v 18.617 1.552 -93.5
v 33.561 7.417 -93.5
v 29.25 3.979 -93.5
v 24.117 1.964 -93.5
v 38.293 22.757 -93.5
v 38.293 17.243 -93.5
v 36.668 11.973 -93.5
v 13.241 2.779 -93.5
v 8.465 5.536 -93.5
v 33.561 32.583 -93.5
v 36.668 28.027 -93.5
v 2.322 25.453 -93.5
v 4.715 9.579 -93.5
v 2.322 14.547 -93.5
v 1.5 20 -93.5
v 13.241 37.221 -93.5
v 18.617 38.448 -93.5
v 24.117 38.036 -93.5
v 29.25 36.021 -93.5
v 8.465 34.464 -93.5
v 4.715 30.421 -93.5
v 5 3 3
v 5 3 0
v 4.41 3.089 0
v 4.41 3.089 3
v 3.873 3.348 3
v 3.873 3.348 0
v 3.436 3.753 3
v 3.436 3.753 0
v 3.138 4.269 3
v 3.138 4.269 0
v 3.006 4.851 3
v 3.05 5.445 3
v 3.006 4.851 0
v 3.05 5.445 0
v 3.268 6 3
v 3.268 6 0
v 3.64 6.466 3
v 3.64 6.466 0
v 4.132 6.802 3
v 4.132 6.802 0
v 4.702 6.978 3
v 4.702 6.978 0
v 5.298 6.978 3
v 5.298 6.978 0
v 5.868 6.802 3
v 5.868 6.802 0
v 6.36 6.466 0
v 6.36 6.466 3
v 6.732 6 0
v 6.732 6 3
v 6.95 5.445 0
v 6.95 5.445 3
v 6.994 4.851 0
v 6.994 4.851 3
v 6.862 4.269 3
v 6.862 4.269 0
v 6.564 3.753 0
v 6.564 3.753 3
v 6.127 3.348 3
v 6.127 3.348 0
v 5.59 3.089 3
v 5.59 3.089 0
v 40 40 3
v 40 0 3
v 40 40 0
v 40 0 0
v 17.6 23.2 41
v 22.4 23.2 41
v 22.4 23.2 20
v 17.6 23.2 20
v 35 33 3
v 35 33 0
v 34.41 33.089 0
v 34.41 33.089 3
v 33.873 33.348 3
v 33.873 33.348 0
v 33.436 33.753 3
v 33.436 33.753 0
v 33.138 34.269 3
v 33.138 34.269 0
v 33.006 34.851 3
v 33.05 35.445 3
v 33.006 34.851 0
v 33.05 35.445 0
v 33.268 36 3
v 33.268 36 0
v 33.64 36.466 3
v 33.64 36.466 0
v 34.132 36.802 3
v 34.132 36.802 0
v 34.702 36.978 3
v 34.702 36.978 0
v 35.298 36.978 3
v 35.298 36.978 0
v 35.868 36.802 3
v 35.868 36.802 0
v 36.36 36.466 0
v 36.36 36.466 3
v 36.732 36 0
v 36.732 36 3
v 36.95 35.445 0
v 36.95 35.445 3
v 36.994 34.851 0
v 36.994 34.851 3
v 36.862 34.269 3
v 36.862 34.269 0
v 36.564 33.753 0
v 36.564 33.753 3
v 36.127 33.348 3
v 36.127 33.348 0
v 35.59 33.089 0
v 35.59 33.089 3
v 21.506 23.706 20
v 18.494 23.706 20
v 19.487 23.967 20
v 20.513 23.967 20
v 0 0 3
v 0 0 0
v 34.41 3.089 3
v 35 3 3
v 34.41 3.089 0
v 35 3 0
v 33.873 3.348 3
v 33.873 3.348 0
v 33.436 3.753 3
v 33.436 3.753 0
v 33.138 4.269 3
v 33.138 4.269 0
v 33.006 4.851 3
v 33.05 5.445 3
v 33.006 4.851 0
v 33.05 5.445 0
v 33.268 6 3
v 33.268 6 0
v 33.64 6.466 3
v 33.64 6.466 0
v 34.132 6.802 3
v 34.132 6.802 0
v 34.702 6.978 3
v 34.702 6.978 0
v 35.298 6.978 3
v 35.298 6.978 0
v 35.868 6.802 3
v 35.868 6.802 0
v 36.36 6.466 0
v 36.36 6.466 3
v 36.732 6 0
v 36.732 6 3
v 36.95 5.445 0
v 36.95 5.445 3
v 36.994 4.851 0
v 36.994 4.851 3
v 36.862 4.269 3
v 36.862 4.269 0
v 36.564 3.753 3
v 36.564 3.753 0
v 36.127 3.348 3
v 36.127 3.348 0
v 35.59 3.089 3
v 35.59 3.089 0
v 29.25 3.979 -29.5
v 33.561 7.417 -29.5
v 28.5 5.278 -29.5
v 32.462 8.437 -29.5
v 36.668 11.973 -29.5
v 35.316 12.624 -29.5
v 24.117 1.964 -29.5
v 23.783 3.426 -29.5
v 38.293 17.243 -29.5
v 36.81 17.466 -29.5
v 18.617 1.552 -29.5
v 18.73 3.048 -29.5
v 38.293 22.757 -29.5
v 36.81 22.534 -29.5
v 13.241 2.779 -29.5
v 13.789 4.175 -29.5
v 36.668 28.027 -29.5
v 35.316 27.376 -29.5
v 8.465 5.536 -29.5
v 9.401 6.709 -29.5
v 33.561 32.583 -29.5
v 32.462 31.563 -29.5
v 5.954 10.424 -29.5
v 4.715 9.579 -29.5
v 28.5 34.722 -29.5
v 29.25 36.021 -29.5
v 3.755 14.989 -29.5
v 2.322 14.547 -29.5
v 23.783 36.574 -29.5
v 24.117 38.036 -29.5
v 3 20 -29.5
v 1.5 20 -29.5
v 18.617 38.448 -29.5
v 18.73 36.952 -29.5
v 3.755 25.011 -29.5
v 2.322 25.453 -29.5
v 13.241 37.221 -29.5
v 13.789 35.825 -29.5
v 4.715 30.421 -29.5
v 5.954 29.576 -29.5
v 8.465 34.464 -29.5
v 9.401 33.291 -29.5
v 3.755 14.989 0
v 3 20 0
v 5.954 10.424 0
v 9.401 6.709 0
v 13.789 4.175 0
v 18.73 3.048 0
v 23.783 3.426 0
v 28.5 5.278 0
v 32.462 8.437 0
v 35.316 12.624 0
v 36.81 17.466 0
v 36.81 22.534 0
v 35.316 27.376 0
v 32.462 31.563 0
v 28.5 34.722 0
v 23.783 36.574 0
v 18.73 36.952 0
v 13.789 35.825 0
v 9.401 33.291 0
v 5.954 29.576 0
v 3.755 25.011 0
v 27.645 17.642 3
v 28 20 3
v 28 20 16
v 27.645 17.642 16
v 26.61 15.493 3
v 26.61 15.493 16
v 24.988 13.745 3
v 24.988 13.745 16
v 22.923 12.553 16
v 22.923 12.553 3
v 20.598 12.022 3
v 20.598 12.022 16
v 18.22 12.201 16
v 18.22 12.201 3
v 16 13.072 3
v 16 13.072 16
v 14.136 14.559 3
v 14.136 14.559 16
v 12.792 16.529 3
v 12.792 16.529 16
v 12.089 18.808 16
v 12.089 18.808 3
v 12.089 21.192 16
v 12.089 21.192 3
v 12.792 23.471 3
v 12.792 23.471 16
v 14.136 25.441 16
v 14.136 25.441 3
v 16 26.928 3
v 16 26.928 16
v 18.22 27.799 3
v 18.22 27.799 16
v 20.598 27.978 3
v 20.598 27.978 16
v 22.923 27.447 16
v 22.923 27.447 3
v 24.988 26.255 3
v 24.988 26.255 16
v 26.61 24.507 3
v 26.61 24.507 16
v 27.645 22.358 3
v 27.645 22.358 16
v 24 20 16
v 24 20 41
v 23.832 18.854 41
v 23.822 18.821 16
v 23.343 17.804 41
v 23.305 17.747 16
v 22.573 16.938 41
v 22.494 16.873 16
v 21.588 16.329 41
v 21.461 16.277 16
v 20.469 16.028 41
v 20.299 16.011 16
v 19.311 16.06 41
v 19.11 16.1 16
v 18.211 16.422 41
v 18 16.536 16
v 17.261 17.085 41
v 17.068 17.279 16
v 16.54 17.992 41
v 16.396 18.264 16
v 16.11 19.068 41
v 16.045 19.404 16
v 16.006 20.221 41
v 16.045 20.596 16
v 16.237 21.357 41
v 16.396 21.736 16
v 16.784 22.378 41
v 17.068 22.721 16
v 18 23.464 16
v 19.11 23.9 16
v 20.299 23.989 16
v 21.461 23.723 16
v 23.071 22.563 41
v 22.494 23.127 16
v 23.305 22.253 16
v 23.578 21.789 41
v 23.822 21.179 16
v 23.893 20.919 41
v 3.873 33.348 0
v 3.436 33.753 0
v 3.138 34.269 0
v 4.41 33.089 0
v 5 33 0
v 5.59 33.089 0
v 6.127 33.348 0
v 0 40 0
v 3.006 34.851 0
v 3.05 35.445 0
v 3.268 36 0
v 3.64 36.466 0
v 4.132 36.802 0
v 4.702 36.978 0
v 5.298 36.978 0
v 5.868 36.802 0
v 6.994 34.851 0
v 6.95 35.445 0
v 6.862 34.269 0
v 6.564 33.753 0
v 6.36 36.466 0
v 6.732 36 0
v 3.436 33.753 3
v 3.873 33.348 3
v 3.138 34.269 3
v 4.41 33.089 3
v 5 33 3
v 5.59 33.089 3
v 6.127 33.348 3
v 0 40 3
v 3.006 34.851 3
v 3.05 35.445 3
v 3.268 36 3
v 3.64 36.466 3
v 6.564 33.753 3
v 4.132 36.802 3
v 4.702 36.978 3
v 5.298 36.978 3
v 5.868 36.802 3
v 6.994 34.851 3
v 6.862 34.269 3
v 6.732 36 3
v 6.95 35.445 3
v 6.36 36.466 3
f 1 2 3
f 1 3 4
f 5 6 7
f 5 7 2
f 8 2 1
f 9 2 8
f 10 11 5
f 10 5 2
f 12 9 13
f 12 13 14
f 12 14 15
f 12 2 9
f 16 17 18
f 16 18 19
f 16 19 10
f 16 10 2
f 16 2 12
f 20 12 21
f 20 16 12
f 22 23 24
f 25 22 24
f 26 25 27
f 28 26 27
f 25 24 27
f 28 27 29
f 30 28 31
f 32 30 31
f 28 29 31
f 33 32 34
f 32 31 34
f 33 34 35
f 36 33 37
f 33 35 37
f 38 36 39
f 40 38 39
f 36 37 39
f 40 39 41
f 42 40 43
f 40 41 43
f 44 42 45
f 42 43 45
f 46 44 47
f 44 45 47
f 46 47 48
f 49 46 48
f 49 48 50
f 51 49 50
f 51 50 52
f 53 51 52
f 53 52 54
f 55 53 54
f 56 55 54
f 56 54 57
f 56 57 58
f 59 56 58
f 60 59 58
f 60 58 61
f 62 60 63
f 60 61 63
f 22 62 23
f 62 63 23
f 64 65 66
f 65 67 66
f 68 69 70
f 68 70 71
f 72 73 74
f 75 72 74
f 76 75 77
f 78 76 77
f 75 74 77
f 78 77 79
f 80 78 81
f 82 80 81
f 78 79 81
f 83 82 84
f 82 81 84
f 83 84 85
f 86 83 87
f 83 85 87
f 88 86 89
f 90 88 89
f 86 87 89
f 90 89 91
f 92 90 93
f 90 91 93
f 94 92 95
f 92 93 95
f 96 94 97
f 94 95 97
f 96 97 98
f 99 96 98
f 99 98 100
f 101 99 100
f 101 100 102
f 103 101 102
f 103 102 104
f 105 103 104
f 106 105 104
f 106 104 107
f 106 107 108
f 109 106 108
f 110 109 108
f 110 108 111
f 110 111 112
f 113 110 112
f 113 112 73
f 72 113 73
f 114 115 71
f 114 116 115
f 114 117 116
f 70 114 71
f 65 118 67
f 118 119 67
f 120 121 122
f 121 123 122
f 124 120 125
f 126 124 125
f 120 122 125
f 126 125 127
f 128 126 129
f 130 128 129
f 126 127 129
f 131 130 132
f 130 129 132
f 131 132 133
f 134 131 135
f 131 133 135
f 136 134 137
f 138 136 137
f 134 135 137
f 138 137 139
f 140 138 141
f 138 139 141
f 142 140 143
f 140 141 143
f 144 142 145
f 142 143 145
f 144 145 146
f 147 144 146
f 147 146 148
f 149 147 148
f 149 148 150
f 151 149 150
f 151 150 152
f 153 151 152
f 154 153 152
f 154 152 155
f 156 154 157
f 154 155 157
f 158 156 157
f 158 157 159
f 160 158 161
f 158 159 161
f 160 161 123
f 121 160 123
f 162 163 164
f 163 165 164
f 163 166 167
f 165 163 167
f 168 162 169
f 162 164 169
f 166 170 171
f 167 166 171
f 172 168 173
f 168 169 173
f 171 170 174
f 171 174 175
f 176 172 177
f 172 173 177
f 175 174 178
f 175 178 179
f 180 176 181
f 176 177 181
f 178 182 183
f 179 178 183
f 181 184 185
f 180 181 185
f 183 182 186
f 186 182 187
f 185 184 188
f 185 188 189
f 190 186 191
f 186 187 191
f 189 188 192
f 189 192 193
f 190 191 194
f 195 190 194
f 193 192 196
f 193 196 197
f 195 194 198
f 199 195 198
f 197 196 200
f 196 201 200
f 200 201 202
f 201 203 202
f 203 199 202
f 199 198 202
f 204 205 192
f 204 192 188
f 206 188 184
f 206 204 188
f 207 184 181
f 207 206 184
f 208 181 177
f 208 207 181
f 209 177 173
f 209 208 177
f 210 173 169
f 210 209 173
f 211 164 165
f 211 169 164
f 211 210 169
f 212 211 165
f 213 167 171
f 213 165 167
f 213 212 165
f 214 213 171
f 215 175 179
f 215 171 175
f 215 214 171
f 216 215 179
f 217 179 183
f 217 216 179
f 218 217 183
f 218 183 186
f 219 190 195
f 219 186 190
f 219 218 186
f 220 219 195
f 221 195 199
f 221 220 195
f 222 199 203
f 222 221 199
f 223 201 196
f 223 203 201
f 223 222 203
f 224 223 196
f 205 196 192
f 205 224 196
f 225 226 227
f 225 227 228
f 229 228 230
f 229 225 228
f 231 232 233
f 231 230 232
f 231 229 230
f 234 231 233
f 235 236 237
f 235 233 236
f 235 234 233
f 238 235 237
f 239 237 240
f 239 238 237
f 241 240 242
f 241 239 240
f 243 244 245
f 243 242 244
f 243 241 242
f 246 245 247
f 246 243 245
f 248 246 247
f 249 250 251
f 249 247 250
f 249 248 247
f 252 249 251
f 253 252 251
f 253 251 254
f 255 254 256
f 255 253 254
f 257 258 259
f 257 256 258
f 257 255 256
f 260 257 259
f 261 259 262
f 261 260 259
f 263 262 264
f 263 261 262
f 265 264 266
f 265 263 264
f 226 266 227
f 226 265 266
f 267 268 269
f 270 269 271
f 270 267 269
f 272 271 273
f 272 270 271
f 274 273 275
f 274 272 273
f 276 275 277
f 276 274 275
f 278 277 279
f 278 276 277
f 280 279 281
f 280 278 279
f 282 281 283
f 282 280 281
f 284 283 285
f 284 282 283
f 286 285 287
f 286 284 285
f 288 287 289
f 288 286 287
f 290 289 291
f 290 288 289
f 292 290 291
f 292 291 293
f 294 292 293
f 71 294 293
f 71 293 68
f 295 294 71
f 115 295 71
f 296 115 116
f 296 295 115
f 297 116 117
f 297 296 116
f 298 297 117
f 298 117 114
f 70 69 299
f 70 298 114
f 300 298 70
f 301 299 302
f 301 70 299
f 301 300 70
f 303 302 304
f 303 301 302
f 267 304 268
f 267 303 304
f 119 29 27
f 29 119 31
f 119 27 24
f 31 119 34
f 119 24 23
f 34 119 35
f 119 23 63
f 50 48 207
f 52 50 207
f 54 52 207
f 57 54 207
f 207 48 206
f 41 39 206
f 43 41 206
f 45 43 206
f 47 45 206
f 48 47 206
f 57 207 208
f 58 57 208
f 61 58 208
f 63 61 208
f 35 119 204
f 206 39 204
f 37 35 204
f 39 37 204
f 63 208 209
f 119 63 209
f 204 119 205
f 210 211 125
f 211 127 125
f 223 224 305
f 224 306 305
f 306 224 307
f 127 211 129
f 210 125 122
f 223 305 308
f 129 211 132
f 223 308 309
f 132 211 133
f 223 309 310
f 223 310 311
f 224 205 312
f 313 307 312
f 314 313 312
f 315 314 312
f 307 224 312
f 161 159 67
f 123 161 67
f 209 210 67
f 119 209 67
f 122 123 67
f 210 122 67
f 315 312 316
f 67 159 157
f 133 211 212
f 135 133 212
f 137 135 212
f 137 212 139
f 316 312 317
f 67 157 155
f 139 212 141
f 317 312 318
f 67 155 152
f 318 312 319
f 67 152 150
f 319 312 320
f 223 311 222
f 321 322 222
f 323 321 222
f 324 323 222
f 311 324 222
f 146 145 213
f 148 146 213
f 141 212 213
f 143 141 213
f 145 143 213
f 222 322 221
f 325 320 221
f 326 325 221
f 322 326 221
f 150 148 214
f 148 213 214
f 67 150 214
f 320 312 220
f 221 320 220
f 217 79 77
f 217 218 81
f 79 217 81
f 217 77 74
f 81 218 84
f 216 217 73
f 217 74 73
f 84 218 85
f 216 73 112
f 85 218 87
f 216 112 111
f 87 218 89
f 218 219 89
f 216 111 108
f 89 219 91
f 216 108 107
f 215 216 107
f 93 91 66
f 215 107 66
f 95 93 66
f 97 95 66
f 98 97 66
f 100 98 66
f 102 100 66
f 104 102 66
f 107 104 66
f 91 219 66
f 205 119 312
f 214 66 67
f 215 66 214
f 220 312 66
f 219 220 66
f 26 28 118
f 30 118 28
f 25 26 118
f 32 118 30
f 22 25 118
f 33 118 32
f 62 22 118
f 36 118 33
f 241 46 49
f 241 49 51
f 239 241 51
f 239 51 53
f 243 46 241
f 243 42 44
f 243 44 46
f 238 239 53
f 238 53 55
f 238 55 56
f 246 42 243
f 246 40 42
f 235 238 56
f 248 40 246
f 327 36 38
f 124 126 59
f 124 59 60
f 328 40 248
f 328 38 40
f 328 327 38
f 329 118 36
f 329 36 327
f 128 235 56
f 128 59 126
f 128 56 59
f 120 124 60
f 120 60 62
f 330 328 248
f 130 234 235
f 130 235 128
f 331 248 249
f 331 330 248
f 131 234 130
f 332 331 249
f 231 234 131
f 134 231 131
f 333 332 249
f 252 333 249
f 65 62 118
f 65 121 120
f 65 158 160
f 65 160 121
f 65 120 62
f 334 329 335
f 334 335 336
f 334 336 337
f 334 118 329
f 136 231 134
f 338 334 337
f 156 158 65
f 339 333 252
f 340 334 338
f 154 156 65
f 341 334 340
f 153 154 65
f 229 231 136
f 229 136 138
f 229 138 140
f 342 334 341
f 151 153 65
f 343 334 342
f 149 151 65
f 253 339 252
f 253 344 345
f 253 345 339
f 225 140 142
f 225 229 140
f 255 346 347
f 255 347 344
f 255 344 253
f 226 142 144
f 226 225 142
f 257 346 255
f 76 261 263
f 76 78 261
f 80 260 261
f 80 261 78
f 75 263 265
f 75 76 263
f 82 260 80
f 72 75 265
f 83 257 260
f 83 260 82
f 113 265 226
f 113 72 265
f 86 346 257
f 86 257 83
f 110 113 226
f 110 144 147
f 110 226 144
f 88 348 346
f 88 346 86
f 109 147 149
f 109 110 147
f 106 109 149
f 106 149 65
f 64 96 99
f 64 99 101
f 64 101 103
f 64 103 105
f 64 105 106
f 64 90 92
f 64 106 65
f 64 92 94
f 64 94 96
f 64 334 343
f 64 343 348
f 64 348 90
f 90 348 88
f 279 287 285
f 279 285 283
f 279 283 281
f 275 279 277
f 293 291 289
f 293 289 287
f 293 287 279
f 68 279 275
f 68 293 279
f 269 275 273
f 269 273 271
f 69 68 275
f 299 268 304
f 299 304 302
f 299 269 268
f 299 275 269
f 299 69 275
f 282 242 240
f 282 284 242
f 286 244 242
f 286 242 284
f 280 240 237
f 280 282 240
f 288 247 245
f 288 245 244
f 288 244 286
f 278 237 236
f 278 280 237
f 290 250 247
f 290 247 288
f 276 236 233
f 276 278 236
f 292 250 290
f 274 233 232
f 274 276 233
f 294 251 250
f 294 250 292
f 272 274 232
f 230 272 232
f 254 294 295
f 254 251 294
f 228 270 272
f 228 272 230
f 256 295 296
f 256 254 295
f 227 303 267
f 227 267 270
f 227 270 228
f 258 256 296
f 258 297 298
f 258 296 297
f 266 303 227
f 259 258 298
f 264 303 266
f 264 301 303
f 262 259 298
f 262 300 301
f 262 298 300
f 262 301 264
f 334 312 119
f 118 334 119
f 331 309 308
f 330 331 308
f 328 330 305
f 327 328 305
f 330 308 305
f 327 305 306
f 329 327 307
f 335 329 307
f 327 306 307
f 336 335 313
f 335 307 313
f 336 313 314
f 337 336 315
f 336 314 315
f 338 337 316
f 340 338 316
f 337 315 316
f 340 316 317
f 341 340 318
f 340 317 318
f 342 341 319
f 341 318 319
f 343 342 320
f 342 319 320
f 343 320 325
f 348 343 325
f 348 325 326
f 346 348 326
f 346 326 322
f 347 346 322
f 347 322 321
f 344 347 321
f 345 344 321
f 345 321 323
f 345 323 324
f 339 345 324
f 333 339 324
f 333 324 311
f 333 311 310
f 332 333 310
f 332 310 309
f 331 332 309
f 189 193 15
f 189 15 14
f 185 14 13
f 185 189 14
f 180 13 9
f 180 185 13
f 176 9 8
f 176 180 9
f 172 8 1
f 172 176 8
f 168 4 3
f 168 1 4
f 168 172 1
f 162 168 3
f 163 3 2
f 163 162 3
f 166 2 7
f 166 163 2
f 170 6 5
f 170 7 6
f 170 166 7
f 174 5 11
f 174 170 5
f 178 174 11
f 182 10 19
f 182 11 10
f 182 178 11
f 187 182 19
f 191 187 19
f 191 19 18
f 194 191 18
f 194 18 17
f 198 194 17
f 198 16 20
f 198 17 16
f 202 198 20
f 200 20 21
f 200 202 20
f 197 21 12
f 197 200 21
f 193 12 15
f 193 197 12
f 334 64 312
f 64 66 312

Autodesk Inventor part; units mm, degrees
ref_plane "YZ Plane" through (0, 0, 0) normal (1, 0, 0) x (0, 1, 0)
ref_plane "XZ Plane" through (0, 0, 0) normal (0, 1, 0) x (-1, 0, 0)
ref_plane "XY Plane" through (0, 0, 0) normal (0, 0, 1) x (1, 0, 0)
sketch "Sketch1" plane through (0, 0, 0) normal (0, 0, 1) x (1, 0, 0)
  line L0 (0, 0) -> (40, 0)
  line L1 (40, 0) -> (40, 40)
  line L2 (40, 40) -> (0, 40)
  line L3 (0, 40) -> (0, 0)
  dimension "d0" = 40
  dimension "d1" = 40
extrude "Extrusion1" add sketch "Sketch1" along normal blind 3
sketch "Sketch2" plane through (0, 0, 3) normal (0, 0, 1) x (1, 0, 0)
  line L0 (40, 0) -> (0, 0) projected
  line L1 (40, 40) -> (40, 0) projected
  line L2 (35, 5) -> (5, 5)
  line L3 (5, 5) -> (5, 35)
  line L4 (5, 35) -> (35, 35)
  line L5 (35, 35) -> (35, 5)
  circle A0 centre (20, 20) radius 8
  dimension "d4" = 30
  dimension "d5" = 30
  dimension "d6" = 5
  dimension "d7" = 5
  dimension "d8" = 16
extrude "Extrusion2" add sketch "Sketch2" along normal blind 13 contours A0
sketch "Sketch3" plane through (0, 0, 3) normal (0, 0, 1) x (1, 0, 0)
  line L0 (40, 0) -> (0, 0) projected
  line L1 (40, 40) -> (40, 0) projected
  line L2 (5, 5) -> (35, 5)
  line L3 (35, 5) -> (35, 35)
  line L4 (35, 35) -> (5, 35)
  line L5 (5, 35) -> (5, 5)
  dimension "d11" = 30
  dimension "d12" = 30
  dimension "d13" = 5
  dimension "d14" = 5
hole "Hole1" at (5, 5, 3) at (35, 5, 3) at (35, 35, 3) at (5, 35, 3) direction (0, 0, -1) diameter 4 end through all
sketch "Sketch4" plane through (20, 20, 16) normal (0, 0, 1) x (1, 0, 0)
  circle A0 centre (0, 0) radius 8 projected
  circle A1 centre (0, 0) radius 4
  point P0 (-20, -20)
  dimension "d22" = 8
extrude "Extrusion3" add sketch "Sketch4" along normal blind 25 contours A1
sketch "Sketch5" plane through (20, 20, 41) normal (0, 0, 1) x (1, 0, 0)
  circle A0 centre (0, 0) radius 4 projected
  line L0 (-4, 0) -> (4, 0)
  line L1 (4, 0) -> (4, 4)
  line L2 (4, 4) -> (-4, 4)
  line L3 (-4, 4) -> (-4, 0)
  line L4 (-4, 4) -> (4, 4)
  line L5 (4, 4) -> (4, 3.2)
  line L6 (4, 3.2) -> (-4, 3.2)
  line L7 (-4, 3.2) -> (-4, 4)
  point P0 (-20, -20)
  dimension "d25" = 0.8
extrude "Extrusion4" cut sketch "Sketch5" against normal blind 21 contours L6 L3 L2 A0 | A0 L6 | A0 L2 L1 L6
sketch "Sketch6" plane through (0, 0, 0) normal (0, 0, -1) x (-1, 0, 0)
  circle A0 centre (-20, 20) radius 17
  dimension "d28" = 34
extrude "Extrusion5" add sketch "Sketch6" along normal blind 29.5
sketch "Sketch7" plane through (20, 20, -29.5) normal (0, 0, -1) x (-1, 0, 0)
  circle A0 centre (0, 0) radius 17 projected
  circle A1 centre (0, 0) radius 18.5
  point P0 (20, -20)
  dimension "d31" = 37
extrude "Extrusion6" add sketch "Sketch7" along normal blind 64 contours A0 | A1
properties part number "mr85vel 2 etapas" material "UHMW, White"
